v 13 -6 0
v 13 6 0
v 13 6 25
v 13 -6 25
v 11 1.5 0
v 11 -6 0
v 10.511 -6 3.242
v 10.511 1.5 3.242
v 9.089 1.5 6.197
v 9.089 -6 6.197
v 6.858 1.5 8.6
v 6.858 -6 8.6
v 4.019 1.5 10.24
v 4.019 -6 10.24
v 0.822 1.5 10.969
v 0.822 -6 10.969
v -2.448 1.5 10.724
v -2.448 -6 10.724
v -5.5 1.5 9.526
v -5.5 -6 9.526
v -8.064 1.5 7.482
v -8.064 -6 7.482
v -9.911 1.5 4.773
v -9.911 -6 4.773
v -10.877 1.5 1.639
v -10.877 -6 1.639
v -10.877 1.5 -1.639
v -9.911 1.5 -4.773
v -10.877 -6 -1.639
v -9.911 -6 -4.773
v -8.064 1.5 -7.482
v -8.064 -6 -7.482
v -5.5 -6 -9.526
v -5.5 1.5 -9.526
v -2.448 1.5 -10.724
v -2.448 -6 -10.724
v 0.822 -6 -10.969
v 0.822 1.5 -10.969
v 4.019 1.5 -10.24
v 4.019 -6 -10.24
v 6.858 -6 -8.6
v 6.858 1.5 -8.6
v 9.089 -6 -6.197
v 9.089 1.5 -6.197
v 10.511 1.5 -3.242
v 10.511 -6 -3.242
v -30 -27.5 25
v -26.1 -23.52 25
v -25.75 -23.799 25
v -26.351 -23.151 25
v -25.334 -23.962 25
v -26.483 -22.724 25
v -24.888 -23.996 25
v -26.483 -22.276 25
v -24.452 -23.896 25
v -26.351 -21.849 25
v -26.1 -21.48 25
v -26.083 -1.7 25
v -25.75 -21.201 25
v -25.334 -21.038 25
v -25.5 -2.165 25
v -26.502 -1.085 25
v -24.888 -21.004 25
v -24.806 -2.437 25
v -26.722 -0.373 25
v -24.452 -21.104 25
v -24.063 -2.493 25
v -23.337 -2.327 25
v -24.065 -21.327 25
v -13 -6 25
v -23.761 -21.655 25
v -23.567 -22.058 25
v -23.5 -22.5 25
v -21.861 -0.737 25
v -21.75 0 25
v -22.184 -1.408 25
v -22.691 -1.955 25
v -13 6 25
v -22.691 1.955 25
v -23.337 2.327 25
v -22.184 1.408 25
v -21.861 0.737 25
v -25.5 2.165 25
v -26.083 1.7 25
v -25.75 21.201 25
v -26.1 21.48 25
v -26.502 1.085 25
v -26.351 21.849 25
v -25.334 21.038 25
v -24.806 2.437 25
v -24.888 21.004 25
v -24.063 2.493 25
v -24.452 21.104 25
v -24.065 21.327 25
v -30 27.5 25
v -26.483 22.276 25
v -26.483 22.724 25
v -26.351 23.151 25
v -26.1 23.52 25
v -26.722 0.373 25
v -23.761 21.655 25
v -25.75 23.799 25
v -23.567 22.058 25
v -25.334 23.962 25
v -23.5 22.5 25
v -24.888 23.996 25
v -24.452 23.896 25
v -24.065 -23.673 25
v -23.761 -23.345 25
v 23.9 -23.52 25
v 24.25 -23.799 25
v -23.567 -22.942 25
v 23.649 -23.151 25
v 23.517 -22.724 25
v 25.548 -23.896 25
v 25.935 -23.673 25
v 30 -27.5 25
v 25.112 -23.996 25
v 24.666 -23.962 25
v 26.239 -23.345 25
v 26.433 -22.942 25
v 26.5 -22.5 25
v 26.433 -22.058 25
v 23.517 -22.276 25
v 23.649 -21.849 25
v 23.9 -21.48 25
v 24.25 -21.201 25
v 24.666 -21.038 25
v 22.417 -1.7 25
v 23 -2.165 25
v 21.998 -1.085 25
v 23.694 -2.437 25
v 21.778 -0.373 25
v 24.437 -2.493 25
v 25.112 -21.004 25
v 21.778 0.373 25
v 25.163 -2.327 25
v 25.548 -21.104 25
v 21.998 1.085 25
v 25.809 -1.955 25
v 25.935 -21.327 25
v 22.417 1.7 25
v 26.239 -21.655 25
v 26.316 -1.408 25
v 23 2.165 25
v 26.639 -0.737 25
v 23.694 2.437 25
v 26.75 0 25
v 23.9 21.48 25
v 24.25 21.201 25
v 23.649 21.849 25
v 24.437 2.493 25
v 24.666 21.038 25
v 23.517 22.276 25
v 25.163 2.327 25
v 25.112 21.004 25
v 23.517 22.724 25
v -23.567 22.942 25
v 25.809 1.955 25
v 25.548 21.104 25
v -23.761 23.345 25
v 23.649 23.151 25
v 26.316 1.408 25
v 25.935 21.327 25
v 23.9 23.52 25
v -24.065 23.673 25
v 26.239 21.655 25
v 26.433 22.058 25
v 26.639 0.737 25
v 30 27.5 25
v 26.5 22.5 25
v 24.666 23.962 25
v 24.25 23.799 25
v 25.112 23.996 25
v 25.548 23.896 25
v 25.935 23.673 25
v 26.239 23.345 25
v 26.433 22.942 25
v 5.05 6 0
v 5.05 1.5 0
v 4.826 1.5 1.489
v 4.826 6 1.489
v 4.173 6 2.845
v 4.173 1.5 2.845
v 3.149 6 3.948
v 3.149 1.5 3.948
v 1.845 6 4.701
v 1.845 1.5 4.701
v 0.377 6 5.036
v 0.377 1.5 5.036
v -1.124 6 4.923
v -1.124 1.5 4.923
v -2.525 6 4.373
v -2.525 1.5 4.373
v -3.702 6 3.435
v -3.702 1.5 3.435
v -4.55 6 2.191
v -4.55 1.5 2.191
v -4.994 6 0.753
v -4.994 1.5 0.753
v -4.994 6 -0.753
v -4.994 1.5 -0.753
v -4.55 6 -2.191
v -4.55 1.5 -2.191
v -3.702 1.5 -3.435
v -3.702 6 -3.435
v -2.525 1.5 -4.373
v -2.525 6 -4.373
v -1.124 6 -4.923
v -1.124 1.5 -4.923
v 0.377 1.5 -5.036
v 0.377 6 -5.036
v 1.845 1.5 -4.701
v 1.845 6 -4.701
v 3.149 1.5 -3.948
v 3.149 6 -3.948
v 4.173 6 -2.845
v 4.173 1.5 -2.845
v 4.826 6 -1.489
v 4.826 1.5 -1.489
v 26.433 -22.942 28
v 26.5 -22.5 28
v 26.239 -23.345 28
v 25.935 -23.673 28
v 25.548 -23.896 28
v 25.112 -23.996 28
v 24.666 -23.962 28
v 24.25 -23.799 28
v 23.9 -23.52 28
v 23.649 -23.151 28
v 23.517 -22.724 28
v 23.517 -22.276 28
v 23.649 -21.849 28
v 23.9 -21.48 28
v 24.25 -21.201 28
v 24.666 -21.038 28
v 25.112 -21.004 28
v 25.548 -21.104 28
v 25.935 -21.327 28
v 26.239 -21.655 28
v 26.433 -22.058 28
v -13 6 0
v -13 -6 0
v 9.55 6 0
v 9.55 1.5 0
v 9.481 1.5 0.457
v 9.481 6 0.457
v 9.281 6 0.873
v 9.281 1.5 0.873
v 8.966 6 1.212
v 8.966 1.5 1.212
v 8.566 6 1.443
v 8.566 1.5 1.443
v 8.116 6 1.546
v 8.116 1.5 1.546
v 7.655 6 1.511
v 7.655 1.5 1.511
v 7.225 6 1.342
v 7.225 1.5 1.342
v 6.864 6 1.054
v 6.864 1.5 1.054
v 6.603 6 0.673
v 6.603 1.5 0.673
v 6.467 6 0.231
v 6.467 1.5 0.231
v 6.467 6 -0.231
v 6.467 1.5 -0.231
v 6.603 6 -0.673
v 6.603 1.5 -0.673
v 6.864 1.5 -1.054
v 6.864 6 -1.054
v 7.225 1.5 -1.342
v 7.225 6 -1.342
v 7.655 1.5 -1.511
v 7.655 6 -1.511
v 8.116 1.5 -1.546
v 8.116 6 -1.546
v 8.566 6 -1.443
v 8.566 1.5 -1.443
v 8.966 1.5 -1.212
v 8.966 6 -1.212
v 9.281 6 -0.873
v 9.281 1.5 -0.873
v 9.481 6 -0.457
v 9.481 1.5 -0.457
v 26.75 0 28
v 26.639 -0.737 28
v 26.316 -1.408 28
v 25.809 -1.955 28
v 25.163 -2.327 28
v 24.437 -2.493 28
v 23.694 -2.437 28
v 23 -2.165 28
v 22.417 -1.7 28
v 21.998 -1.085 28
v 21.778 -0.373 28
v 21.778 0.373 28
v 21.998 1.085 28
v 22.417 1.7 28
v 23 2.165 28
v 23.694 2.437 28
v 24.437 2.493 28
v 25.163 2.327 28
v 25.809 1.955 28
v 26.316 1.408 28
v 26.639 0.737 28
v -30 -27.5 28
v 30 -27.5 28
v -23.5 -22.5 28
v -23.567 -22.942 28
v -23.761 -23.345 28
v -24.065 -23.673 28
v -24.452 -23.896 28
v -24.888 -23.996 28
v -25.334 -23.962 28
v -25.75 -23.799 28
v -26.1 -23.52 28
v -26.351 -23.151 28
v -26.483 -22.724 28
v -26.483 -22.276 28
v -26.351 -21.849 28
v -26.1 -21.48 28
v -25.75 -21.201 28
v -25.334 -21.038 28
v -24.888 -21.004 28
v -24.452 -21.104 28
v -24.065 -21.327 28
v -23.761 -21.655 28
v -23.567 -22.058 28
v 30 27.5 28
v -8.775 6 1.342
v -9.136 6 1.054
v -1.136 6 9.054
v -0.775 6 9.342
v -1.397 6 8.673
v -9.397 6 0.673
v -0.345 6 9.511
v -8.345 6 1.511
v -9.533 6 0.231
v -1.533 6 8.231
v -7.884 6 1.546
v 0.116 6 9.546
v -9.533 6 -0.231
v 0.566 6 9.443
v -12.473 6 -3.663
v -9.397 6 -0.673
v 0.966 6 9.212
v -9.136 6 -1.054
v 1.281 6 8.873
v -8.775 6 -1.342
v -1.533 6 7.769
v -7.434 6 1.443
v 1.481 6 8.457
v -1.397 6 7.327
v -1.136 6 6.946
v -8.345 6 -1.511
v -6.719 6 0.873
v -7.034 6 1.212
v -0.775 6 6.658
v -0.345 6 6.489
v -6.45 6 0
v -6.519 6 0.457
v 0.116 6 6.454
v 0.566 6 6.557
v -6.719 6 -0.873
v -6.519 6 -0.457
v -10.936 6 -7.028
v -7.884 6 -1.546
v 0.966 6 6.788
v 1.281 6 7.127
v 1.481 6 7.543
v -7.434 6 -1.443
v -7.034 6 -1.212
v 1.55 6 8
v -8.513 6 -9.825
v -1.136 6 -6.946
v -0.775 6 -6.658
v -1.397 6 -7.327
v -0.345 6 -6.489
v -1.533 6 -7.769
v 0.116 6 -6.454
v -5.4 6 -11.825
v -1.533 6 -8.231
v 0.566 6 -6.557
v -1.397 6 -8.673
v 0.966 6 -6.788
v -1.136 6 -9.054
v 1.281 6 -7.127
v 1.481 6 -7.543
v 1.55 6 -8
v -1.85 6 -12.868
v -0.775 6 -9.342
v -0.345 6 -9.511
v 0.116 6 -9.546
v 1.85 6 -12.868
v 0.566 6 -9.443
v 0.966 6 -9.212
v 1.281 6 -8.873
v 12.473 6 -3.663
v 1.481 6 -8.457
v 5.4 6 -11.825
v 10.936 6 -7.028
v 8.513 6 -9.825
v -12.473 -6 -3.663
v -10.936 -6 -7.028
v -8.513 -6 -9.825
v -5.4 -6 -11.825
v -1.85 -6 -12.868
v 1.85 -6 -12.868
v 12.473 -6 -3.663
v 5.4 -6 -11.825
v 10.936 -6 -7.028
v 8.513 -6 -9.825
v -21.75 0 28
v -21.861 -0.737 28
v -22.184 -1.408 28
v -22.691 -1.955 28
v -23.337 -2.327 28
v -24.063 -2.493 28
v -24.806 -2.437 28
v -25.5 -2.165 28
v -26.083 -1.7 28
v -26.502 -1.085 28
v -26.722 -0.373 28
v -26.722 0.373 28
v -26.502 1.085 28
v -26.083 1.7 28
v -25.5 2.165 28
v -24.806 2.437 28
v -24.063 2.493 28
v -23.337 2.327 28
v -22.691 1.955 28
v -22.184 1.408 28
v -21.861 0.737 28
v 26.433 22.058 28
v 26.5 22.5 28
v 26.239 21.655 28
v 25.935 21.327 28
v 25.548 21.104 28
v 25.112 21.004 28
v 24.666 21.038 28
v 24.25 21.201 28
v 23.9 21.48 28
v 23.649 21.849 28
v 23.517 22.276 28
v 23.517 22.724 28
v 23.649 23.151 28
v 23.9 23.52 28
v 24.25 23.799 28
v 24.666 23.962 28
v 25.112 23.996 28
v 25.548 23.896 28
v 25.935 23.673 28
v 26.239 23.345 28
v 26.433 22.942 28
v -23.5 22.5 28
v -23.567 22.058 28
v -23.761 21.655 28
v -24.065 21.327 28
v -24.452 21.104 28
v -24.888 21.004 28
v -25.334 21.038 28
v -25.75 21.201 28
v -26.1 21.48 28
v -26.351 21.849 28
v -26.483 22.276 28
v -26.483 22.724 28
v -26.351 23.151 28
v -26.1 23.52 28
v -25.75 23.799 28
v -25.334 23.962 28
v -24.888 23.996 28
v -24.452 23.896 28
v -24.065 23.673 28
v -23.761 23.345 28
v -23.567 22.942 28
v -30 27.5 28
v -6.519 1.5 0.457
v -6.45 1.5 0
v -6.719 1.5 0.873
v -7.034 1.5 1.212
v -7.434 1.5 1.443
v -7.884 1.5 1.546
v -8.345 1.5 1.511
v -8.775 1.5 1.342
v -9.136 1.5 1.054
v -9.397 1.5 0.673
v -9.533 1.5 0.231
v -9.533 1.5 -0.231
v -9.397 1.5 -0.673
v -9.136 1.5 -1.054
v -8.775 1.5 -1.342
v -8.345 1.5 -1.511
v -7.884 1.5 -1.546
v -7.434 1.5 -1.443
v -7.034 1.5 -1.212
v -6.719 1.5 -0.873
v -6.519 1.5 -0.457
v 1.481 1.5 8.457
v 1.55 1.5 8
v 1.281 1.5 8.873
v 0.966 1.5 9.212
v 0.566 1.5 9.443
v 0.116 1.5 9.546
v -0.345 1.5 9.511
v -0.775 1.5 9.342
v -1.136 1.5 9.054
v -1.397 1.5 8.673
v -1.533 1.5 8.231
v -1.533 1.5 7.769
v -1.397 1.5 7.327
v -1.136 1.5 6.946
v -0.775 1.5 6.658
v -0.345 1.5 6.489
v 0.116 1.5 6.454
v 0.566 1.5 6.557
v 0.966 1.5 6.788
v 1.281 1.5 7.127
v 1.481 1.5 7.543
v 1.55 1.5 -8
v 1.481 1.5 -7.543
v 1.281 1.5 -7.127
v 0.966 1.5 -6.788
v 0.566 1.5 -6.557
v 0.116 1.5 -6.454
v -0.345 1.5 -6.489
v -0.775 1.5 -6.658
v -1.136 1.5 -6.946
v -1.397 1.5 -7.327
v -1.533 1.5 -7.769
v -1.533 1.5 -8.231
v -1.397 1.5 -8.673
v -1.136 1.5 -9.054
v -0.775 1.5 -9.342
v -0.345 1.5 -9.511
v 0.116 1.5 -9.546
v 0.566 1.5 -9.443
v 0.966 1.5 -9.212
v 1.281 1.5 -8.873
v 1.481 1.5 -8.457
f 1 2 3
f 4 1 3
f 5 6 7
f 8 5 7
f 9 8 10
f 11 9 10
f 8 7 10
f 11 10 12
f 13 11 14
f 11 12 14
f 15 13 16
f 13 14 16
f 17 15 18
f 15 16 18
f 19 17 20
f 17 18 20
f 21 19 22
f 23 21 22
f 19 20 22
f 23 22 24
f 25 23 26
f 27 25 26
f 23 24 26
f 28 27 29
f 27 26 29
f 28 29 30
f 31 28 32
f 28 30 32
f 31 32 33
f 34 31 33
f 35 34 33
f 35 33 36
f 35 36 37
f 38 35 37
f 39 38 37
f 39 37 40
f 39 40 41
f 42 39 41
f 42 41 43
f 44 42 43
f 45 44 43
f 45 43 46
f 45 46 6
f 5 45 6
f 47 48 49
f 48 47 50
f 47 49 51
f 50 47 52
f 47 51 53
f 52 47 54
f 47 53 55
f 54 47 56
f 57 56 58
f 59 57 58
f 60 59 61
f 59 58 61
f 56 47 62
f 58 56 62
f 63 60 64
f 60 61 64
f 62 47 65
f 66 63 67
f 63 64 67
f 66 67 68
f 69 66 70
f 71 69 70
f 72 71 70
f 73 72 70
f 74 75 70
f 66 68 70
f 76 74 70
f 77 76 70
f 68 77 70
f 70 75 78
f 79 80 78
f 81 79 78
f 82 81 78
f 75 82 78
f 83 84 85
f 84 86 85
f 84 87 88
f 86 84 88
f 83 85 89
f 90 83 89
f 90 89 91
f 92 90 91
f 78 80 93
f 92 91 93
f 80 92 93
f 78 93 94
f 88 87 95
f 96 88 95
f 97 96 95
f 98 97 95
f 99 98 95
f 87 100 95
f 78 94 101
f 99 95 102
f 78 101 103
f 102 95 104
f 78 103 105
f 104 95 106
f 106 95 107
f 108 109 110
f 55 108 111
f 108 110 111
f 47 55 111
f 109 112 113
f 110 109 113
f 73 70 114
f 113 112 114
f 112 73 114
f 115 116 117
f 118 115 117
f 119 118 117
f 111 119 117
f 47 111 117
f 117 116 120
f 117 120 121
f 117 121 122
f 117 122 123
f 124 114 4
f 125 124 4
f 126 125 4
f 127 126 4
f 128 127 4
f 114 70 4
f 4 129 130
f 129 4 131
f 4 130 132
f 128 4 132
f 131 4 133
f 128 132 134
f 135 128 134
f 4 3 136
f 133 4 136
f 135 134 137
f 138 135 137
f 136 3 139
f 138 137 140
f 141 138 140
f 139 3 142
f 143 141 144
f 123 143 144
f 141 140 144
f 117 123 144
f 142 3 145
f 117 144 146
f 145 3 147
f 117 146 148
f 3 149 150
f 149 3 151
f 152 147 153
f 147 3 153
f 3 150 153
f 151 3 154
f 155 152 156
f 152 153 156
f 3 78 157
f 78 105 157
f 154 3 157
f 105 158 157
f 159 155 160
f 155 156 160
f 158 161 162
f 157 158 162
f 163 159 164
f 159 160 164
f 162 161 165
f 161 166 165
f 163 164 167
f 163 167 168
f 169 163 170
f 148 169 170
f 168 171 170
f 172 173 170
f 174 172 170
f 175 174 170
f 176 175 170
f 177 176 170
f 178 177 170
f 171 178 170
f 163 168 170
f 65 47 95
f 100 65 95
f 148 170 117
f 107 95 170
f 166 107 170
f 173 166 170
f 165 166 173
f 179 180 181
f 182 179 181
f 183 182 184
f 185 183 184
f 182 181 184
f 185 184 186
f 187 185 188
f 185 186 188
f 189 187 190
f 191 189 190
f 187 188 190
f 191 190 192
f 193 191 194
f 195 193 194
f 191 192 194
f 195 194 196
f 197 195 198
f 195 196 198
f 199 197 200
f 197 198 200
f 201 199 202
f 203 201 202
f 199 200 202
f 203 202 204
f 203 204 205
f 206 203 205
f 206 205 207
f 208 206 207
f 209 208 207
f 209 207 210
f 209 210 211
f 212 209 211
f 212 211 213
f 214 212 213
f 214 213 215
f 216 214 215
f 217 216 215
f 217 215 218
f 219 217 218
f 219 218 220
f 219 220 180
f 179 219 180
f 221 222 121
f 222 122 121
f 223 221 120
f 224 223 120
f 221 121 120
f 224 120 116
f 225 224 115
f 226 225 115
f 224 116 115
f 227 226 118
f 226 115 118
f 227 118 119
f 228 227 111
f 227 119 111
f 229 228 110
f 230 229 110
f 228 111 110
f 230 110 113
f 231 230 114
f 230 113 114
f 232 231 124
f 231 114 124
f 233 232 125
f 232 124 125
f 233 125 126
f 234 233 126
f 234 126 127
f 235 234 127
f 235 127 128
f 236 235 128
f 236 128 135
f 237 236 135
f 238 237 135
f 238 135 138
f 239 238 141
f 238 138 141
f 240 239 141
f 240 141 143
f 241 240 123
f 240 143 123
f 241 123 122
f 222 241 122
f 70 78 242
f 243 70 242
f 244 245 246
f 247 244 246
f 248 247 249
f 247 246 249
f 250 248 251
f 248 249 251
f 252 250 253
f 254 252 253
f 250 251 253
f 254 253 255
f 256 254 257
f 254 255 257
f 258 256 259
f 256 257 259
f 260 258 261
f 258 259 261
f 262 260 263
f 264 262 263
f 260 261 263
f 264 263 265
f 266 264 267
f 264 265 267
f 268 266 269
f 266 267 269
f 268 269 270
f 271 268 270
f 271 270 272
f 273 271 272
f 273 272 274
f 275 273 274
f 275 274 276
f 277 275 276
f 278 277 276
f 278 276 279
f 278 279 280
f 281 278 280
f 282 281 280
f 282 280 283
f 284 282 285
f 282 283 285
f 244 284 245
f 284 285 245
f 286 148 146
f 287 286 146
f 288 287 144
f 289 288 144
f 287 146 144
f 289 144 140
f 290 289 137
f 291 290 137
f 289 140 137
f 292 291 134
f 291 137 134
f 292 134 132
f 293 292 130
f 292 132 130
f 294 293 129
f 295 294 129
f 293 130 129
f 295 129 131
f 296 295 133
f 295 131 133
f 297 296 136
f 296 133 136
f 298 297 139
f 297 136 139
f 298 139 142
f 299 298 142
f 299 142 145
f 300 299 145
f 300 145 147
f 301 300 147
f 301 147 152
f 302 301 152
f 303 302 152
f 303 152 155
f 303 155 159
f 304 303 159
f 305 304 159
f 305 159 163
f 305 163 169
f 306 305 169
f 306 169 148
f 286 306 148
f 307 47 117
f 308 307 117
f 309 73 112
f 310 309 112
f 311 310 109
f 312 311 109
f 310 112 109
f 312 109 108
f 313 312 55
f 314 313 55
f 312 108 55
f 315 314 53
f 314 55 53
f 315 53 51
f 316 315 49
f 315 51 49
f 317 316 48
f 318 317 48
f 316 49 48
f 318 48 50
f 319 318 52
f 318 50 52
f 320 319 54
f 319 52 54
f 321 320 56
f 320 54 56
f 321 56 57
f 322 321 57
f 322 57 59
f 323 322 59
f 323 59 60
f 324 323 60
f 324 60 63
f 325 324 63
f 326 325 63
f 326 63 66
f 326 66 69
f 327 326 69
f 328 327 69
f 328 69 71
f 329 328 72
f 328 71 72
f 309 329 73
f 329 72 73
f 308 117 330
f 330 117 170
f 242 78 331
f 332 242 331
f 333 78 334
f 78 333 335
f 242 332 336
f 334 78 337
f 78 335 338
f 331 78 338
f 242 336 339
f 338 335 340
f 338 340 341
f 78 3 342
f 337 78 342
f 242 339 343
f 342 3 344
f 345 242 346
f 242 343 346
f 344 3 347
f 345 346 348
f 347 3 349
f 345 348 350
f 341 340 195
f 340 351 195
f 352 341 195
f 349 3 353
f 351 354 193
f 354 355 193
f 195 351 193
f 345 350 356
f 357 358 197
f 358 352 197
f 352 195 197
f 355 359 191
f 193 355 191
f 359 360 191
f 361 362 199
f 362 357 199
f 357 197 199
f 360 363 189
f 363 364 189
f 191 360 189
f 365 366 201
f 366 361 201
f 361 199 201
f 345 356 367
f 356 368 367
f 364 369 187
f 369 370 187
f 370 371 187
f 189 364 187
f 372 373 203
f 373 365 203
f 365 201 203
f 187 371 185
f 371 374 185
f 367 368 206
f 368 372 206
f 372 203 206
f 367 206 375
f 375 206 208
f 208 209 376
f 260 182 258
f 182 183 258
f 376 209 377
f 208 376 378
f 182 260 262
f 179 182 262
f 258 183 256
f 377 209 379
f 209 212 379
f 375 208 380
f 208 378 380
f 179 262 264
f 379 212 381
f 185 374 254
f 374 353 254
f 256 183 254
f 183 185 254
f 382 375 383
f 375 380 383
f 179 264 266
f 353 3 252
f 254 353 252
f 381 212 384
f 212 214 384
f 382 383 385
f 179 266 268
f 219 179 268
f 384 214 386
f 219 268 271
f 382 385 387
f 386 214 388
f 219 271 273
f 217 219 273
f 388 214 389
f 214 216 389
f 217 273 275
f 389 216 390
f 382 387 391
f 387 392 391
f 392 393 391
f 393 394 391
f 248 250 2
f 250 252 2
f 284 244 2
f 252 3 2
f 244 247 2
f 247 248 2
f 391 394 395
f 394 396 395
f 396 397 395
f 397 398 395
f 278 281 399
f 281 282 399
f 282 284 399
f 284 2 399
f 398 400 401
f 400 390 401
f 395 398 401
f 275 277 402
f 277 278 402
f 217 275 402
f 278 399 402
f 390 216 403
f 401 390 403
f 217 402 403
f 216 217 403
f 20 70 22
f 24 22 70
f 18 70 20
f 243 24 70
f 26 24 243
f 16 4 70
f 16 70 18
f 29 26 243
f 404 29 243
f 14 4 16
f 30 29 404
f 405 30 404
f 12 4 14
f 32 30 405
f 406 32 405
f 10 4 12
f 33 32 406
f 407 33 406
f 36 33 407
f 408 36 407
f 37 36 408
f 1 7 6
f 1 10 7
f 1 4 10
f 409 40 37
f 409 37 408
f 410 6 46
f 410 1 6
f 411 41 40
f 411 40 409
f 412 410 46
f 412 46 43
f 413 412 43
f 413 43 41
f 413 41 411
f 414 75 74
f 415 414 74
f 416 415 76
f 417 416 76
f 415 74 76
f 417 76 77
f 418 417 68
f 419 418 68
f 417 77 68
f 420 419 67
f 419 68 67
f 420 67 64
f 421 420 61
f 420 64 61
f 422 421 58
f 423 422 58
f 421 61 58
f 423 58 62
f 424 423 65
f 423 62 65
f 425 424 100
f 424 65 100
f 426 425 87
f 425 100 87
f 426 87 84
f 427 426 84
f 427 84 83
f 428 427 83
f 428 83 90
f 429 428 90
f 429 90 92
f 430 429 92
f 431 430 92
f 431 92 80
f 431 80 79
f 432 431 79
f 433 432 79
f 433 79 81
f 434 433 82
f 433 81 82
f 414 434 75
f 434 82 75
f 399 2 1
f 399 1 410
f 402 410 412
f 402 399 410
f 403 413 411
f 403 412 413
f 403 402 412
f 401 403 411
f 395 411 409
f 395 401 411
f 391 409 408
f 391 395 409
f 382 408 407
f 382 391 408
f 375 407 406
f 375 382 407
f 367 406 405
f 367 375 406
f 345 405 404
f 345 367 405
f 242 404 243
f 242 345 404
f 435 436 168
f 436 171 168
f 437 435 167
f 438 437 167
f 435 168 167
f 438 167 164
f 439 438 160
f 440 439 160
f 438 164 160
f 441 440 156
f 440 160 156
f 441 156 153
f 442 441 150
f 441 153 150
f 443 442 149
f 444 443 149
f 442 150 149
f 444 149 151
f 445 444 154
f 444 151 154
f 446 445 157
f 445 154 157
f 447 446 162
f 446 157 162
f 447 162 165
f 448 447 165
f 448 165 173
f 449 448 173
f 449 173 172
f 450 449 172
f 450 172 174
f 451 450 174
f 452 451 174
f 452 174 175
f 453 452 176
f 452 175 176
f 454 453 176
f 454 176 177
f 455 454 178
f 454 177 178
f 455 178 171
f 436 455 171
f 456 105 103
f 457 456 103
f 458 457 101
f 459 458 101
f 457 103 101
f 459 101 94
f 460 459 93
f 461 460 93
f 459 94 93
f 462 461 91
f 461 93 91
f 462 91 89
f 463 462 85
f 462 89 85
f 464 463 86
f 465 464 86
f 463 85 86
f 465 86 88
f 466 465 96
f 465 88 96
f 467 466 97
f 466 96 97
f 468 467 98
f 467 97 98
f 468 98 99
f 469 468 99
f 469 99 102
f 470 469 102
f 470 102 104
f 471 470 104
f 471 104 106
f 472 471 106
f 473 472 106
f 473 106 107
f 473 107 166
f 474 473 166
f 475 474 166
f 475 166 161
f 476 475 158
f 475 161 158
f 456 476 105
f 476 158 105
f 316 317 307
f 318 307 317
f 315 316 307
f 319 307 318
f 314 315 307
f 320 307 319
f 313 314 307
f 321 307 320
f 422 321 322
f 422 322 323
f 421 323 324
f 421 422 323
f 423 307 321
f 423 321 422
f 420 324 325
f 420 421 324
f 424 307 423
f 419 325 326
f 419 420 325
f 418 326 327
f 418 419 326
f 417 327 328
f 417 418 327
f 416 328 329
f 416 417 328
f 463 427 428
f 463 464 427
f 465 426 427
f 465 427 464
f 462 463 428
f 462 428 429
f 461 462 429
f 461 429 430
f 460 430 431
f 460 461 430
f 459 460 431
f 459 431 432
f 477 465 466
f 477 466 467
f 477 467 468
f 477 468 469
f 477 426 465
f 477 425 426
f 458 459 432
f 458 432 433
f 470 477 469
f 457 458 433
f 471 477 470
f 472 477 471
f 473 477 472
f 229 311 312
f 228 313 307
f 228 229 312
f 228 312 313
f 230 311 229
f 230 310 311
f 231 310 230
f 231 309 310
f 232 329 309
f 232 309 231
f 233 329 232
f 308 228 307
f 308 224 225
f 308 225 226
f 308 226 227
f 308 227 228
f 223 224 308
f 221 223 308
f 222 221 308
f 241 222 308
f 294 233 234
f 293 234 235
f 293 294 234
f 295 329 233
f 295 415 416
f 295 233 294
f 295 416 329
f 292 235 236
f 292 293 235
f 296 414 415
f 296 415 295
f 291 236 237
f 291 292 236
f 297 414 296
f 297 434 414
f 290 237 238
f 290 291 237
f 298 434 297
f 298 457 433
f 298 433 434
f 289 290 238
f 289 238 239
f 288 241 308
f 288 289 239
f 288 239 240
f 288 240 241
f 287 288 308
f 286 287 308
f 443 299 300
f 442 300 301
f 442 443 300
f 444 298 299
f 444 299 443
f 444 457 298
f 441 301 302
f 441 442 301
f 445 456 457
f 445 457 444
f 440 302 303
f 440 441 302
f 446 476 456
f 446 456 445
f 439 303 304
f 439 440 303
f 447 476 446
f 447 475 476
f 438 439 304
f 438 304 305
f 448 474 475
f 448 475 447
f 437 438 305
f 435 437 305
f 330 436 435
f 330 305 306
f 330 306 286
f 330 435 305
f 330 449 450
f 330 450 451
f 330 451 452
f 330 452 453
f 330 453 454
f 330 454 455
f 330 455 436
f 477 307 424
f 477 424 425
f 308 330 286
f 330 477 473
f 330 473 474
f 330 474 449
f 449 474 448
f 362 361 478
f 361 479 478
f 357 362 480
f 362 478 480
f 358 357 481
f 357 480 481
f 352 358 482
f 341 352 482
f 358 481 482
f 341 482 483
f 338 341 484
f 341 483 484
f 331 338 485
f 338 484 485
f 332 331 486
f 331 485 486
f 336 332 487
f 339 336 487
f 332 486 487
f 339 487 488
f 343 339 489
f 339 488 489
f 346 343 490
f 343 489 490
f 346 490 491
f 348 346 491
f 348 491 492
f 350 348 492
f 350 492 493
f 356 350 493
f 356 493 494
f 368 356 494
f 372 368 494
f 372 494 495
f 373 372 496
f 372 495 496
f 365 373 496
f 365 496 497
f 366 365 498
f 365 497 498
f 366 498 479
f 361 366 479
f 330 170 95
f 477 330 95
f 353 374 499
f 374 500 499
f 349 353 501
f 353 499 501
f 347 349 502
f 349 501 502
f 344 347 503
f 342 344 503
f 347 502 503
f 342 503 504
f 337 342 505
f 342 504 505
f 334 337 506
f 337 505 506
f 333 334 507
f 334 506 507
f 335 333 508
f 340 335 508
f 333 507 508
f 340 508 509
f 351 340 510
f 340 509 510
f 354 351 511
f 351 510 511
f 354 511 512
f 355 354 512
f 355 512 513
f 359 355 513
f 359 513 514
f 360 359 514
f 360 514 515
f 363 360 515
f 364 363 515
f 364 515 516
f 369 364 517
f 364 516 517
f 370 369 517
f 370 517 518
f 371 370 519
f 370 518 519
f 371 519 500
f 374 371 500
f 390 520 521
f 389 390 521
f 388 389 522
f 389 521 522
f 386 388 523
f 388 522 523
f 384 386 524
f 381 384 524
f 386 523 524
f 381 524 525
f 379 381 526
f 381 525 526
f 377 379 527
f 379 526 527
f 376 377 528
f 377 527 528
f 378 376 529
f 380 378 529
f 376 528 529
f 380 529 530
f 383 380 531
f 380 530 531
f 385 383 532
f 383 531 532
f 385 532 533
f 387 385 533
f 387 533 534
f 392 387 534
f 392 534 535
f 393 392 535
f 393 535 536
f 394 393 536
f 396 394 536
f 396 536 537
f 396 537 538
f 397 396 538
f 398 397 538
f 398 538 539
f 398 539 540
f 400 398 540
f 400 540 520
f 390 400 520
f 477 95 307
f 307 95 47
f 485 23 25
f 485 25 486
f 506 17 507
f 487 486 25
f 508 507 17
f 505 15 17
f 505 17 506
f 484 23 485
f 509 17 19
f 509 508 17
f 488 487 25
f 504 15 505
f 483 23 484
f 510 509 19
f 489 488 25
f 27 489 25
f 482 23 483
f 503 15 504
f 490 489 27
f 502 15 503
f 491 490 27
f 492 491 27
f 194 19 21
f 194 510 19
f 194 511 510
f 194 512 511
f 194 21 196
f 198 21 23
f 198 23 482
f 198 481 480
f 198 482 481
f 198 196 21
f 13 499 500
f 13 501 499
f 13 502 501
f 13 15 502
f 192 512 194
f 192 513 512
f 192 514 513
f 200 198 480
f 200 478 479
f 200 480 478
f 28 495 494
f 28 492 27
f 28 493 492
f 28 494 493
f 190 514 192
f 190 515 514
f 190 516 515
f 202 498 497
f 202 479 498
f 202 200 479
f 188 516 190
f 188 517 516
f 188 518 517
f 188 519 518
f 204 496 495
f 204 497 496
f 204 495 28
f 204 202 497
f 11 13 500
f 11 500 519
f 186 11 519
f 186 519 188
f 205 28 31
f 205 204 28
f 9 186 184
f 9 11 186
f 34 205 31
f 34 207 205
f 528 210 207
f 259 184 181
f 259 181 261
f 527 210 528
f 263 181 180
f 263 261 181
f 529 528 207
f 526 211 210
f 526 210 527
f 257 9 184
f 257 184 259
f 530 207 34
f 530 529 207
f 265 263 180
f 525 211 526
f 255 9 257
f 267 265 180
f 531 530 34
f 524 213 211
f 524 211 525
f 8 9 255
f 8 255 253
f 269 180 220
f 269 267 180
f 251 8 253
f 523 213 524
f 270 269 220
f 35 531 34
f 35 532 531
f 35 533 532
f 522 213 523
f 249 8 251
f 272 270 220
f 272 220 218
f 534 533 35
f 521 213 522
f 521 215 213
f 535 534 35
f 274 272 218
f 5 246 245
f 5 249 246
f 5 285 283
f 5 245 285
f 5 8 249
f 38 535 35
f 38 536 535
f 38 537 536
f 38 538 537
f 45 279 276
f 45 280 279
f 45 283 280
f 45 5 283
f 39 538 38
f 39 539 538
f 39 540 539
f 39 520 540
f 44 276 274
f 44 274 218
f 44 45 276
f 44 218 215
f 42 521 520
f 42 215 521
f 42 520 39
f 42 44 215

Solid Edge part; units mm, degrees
sketch "Sketch1" plane through (0, 0, 0) normal (0, -1, 0) x (1, 0, 0)
  line L0 (13, 0) -> (13, 25)
  line L1 (13, 25) -> (-13, 25)
  line L2 (-13, 25) -> (-13, 0)
  arc A0 (-13, 0) -> (13, 0) centre (0, 0) ccw
extrude "Protrusion1" add sketch "Sketch1" along normal mid plane 12
sketch "Sketch2" plane through (0, -6, 3.75) normal (0, -1, 0) x (1, 0, 0)
  circle A0 centre (0, -3.75) radius 5.05
extrude "Cutout1" cut sketch "Sketch2" against normal up to next
sketch "Sketch3" plane through (0, -6, 3.75) normal (0, -1, 0) x (1, 0, 0)
  circle A0 centre (0, -3.75) radius 11
extrude "ExtrudedCutout_2" cut sketch "Sketch3" against normal blind 7.5
sketch "Sketch4" plane through (0, 0, 25) normal (0, 0, 1) x (1, 0, 0)
  line L0 (-30, -27.5) -> (30, -27.5)
  line L1 (30, -27.5) -> (30, 27.5)
  line L2 (30, 27.5) -> (-30, 27.5)
  line L3 (-30, 27.5) -> (-30, -27.5)
extrude "ExtrudedProtrusion_3" add sketch "Sketch4" along normal blind 3
sketch "Sketch5" plane through (0, 0, 25) normal (0, 0, -1) x (1, 0, 0)
  circle A0 centre (-24.25, 0) radius 2.5
  circle A1 centre (24.25, 0) radius 2.5
  circle A2 centre (-25, 22.5) radius 1.5
  circle A3 centre (25, 22.5) radius 1.5
  circle A4 centre (25, -22.5) radius 1.5
  circle A5 centre (-25, -22.5) radius 1.5
  dimension "D1" = 24.25
  dimension "D2" = 5
  dimension "D3" = 5
extrude "Cutout2" cut sketch "Sketch5" against normal up to next
sketch "Sketch6" plane through (0, 1.5, 0) normal (0, -1, 0) x (1, 0, 0)
  circle A0 centre (8, 0) radius 1.55
  circle A1 centre (-8, 0) radius 1.55
  circle A2 centre (0, 8) radius 1.55
  circle A3 centre (0, -8) radius 1.55
  dimension "D1" = 8
  dimension "D2" = 8
extrude "Cutout3" cut sketch "Sketch6" against normal up to next
